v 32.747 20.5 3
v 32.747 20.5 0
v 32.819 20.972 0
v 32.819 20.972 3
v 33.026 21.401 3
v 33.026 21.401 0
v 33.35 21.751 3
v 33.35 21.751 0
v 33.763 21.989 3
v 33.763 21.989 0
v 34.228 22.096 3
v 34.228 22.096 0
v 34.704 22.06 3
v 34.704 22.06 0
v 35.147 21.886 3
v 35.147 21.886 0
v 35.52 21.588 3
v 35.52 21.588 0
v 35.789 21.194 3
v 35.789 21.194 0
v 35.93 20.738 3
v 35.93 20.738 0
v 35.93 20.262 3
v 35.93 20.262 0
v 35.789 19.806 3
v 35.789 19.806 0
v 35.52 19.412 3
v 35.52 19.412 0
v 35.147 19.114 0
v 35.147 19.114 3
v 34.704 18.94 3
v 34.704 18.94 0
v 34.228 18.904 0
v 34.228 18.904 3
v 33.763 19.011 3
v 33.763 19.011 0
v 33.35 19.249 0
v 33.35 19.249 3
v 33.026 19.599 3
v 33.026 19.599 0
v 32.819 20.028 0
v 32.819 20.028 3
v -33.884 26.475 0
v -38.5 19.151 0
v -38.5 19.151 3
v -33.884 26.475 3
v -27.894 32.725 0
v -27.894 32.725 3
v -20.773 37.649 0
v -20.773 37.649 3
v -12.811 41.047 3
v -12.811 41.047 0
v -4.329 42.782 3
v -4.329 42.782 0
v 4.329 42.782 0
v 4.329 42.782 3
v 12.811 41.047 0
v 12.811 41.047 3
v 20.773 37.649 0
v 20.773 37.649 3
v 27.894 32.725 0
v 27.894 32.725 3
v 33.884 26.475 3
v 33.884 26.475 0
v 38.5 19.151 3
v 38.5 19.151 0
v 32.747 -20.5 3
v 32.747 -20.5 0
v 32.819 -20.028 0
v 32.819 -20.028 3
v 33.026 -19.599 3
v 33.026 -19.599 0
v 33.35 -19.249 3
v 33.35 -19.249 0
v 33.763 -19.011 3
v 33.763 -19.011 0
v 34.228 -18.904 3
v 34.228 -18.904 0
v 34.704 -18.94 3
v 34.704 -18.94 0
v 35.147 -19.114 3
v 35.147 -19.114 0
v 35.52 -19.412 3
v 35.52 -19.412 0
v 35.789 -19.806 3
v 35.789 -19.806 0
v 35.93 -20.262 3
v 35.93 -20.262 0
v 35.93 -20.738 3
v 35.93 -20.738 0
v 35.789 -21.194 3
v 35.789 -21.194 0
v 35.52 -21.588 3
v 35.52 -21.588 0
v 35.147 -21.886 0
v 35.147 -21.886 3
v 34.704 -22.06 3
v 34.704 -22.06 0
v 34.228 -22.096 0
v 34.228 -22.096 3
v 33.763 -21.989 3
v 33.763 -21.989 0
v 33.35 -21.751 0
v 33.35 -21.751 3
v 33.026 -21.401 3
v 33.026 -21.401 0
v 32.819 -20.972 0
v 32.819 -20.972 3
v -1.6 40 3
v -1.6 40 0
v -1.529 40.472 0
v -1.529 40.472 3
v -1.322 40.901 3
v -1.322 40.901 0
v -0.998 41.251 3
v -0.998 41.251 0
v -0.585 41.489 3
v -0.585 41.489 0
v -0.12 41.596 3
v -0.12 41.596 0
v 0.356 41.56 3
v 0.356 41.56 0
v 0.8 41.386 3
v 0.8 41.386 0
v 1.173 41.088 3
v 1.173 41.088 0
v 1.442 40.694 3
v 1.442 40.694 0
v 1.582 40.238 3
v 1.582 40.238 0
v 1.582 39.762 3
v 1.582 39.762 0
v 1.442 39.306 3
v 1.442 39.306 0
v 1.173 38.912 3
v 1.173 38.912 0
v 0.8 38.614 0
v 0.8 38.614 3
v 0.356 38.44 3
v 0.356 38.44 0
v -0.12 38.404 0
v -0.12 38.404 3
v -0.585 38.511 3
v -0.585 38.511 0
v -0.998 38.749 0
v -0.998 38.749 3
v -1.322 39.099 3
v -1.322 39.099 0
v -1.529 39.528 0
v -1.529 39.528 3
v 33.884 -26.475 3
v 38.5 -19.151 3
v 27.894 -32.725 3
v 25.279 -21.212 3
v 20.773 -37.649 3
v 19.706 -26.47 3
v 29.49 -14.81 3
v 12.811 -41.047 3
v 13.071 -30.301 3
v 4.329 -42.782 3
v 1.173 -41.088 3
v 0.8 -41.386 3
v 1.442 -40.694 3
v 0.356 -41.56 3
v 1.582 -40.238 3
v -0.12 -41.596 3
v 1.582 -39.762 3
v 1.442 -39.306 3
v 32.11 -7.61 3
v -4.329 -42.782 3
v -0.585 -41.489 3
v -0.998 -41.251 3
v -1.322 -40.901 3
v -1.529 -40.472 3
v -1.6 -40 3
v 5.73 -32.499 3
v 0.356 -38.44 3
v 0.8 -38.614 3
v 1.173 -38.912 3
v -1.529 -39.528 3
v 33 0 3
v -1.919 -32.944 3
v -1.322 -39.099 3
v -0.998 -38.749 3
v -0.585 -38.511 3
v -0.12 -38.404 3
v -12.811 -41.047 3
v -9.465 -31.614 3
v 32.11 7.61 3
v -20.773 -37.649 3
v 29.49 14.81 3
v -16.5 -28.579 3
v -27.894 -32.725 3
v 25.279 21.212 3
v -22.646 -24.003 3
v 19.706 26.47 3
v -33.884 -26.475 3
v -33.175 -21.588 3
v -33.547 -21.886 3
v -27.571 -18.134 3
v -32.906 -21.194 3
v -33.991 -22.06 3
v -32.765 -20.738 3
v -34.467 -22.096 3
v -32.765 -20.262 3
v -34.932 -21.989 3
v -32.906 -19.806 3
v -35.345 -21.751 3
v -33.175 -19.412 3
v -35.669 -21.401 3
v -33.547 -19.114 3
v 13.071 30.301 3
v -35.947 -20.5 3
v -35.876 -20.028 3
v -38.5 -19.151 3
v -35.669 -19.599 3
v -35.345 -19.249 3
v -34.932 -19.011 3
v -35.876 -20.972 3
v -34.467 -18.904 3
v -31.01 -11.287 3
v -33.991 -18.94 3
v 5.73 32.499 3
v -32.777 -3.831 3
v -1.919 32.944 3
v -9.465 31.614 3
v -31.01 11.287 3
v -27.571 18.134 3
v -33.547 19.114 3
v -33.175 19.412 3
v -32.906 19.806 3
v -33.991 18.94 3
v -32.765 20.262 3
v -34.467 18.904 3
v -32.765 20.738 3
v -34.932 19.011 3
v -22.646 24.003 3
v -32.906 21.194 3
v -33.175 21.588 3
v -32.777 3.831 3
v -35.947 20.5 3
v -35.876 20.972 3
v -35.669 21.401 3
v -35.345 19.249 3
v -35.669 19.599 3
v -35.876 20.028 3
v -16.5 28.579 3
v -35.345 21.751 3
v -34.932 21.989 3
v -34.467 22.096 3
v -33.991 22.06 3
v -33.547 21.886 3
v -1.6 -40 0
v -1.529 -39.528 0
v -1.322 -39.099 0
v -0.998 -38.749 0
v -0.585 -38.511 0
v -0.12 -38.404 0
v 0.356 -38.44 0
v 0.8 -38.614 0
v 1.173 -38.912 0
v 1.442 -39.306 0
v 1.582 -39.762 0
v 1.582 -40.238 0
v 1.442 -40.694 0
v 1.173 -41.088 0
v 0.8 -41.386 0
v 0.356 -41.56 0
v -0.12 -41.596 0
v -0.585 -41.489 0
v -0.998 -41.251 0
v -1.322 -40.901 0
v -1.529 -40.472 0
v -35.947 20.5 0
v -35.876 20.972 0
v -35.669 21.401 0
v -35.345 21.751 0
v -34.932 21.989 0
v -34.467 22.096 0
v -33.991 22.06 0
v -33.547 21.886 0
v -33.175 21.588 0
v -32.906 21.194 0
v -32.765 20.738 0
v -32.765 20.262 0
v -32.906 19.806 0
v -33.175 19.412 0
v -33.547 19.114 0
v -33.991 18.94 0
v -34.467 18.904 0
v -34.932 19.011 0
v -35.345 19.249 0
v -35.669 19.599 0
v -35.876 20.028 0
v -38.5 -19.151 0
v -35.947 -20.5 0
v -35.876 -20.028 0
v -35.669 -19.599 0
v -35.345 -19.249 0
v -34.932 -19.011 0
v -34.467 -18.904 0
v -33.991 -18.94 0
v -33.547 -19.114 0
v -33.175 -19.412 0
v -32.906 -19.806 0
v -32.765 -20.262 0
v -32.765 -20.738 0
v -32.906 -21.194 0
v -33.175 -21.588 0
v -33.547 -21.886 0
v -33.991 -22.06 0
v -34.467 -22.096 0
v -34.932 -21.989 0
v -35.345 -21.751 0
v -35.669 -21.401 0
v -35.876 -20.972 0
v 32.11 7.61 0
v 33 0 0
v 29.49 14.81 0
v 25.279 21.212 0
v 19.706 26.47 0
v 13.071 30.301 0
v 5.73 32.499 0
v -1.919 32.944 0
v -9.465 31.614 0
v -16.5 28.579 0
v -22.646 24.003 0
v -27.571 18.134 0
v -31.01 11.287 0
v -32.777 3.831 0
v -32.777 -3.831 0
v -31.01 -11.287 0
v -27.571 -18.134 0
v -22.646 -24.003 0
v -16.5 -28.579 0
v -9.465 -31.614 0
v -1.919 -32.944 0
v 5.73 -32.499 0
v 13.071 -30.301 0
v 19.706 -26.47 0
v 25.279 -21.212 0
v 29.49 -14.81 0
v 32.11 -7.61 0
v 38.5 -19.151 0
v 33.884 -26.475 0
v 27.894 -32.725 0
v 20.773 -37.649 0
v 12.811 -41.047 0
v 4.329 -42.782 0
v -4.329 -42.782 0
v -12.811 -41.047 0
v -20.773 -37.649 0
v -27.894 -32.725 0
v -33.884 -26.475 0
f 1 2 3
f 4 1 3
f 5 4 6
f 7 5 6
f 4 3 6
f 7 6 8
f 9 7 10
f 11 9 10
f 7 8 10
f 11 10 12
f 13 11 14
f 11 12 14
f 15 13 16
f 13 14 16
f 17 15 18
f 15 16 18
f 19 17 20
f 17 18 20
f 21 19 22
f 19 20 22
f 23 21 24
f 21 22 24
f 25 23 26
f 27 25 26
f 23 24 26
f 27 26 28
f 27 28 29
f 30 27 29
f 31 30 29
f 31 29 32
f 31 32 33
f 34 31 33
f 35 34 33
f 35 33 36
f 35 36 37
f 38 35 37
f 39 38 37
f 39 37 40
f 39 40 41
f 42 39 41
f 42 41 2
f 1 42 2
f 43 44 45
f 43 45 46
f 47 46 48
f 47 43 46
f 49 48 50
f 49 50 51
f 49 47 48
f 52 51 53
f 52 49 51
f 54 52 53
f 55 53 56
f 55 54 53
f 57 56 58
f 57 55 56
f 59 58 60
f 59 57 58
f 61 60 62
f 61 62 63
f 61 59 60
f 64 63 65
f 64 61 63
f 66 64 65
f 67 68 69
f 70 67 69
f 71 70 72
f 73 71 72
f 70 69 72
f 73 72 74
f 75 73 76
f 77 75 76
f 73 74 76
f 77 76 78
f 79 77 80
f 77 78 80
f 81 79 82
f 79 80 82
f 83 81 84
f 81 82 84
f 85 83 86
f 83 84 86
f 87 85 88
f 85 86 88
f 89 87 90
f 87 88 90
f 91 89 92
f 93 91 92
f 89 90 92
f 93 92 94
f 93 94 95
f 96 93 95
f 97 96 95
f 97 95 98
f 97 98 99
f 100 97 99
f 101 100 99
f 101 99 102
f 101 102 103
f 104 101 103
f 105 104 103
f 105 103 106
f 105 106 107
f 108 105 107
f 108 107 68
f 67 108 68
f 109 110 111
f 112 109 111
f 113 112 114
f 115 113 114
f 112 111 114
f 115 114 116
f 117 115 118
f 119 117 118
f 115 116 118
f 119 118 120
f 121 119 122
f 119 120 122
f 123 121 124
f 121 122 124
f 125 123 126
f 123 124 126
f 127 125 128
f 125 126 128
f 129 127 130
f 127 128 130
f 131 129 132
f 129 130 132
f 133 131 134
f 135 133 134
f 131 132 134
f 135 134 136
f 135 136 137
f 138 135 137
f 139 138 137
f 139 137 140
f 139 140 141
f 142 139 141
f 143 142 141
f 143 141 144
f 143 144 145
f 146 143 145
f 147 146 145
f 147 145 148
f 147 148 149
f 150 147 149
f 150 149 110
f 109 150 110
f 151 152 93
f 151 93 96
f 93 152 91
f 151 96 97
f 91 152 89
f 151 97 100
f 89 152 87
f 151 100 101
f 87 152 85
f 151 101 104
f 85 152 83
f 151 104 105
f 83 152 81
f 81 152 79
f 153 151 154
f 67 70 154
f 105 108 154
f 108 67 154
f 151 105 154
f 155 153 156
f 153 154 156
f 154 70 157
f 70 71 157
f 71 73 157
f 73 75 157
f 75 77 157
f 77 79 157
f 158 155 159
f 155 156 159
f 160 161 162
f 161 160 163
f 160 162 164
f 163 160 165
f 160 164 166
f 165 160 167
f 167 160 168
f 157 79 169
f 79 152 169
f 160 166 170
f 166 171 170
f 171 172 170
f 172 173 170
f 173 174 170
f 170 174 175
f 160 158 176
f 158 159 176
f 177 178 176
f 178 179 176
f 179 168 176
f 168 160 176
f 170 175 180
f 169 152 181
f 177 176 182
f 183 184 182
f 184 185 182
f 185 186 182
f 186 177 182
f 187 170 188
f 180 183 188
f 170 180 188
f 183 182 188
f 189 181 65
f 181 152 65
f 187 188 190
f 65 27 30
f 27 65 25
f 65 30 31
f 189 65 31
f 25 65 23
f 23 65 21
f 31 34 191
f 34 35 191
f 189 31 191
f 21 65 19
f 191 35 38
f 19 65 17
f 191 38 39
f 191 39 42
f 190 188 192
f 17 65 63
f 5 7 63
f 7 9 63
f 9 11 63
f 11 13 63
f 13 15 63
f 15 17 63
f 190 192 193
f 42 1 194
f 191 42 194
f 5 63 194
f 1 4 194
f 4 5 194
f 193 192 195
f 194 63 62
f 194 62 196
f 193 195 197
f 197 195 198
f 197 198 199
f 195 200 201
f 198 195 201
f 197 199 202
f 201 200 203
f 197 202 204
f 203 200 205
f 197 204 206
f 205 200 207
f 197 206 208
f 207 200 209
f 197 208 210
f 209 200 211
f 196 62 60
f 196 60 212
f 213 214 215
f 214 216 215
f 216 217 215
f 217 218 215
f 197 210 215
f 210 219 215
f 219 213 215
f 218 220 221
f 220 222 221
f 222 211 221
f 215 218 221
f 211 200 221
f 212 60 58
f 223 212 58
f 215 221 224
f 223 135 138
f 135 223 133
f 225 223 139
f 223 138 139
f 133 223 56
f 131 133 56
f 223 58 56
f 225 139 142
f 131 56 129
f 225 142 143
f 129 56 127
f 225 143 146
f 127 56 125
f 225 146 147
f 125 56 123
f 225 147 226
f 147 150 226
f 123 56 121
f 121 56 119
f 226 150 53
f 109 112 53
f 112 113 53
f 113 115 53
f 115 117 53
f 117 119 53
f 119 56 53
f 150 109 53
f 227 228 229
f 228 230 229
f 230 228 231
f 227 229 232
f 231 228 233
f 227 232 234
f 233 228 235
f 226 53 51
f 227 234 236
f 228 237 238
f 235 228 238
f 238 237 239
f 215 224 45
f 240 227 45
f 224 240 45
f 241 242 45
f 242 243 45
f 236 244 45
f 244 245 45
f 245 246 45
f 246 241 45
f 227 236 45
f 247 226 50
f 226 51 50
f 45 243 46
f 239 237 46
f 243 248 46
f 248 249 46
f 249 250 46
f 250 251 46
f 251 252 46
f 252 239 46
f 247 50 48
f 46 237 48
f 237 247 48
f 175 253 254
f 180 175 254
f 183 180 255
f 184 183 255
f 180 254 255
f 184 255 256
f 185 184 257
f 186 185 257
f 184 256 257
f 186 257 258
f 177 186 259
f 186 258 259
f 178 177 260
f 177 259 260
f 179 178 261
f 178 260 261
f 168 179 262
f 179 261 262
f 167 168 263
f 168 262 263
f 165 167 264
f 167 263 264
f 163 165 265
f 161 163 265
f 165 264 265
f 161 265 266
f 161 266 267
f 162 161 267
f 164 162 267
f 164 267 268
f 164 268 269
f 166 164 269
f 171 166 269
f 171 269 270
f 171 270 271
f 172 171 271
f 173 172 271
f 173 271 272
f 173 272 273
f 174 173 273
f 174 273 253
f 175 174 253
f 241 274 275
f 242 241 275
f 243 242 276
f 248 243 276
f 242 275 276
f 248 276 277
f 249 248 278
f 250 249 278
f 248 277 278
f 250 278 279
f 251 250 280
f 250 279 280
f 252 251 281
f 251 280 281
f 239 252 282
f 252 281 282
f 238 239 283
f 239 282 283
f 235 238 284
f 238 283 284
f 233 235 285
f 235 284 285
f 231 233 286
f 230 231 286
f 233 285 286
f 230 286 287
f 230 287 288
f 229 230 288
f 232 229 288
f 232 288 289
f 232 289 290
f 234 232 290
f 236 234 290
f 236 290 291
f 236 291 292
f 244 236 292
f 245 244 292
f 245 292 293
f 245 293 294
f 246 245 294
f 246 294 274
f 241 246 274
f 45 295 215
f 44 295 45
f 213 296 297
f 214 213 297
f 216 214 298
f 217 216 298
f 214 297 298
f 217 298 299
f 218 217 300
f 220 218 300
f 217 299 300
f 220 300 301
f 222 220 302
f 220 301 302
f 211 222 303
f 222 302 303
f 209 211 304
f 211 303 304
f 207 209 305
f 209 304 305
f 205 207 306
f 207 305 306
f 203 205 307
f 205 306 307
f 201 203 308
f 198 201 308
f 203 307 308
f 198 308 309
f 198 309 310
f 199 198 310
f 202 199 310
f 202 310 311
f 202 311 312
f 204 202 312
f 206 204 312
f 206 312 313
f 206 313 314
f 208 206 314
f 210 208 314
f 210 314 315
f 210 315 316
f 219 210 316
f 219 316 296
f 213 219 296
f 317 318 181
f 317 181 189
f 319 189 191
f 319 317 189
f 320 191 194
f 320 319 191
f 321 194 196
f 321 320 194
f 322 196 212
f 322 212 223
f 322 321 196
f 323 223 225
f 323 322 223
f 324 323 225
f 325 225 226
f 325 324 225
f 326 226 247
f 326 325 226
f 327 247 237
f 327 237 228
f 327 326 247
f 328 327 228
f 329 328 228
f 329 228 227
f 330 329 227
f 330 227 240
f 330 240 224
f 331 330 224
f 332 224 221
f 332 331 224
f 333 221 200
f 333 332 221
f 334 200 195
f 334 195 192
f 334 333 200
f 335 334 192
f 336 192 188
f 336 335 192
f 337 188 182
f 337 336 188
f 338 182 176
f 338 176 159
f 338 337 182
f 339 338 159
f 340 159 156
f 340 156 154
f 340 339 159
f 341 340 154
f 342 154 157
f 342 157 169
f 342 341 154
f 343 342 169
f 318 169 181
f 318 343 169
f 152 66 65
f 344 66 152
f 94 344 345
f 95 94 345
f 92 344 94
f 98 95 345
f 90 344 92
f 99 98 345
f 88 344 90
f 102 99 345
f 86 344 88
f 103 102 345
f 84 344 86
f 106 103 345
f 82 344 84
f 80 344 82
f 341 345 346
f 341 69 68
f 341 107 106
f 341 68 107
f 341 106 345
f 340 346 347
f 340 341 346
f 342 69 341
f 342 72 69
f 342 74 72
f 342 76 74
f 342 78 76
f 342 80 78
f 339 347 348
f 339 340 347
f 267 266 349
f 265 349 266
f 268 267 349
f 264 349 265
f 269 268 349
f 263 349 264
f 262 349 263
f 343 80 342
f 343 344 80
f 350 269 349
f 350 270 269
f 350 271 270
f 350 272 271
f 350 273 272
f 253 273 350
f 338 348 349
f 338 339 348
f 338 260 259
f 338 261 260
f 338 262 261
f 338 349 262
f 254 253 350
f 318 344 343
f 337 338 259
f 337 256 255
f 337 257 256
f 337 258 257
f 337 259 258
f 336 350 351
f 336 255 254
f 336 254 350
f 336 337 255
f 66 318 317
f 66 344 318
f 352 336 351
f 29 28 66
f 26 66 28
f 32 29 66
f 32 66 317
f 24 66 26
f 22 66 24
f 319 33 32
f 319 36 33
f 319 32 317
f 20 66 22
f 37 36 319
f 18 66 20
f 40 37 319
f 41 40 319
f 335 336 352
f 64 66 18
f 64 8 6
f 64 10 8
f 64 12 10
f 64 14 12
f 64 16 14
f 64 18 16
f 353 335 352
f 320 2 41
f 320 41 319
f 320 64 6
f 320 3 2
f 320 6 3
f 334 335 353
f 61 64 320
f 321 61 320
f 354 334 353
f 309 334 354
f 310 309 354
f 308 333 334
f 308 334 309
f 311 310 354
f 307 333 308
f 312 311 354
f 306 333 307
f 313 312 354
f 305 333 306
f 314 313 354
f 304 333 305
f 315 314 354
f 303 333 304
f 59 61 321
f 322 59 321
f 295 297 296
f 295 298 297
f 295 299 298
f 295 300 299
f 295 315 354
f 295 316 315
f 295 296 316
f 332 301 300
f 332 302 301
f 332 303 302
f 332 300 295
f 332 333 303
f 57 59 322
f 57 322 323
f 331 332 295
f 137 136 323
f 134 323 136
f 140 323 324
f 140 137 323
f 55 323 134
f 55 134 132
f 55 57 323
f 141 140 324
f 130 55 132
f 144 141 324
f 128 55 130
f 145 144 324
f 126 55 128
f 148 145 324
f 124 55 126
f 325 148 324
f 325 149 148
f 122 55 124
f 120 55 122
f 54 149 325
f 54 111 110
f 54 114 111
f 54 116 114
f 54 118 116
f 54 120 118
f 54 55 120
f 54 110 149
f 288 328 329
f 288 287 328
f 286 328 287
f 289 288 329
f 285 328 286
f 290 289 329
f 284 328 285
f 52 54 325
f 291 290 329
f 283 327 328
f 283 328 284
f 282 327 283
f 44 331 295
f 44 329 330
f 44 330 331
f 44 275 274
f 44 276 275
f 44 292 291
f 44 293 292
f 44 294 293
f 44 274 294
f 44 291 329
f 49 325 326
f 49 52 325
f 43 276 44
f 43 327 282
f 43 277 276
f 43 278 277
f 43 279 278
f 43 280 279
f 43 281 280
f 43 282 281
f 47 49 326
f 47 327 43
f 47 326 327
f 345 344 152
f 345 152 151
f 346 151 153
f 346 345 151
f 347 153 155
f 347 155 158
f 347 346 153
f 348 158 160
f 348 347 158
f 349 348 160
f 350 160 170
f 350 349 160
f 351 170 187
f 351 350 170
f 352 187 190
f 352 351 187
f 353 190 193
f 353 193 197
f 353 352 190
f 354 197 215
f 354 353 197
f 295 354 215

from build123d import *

# Parameters (mm, degrees)
SKIZZE1_R                        = 33
AUFSATZ_LINEAR_AUSTRAGEN1_DEPTH  = 3
F_3_2_3_2_DURCHMESSER_BOHRUNG1_D = 3.2


with BuildPart() as part:
    # Skizze1 → Aufsatz-Linear austragen1 (new body)
    with BuildSketch(Plane.XY):
        with BuildLine():
            Line((-38.5, -19.150718002), (-38.5, 19.150718002))
            ThreePointArc((-38.5, 19.150718002), (0, 43), (38.5, 19.150718002))
            Line((38.5, 19.150718002), (38.5, -19.150718002))
            ThreePointArc((38.5, -19.150718002), (0, -43), (-38.5, -19.150718002))
        make_face()
        Circle(SKIZZE1_R, mode=Mode.SUBTRACT)
    extrude(amount=AUFSATZ_LINEAR_AUSTRAGEN1_DEPTH)

    # Ø3.2 (3.2) Durchmesser Bohrung1 (through all)
    with Locations(Plane.XY.offset(3)):
        with Locations((-34.347488991, 20.5), (0, 40), (0, -40), (34.347488991, -20.5), (34.347488991, 20.5), (-34.347488991, -20.5)):
            Hole(F_3_2_3_2_DURCHMESSER_BOHRUNG1_D / 2)


solid = part.part
